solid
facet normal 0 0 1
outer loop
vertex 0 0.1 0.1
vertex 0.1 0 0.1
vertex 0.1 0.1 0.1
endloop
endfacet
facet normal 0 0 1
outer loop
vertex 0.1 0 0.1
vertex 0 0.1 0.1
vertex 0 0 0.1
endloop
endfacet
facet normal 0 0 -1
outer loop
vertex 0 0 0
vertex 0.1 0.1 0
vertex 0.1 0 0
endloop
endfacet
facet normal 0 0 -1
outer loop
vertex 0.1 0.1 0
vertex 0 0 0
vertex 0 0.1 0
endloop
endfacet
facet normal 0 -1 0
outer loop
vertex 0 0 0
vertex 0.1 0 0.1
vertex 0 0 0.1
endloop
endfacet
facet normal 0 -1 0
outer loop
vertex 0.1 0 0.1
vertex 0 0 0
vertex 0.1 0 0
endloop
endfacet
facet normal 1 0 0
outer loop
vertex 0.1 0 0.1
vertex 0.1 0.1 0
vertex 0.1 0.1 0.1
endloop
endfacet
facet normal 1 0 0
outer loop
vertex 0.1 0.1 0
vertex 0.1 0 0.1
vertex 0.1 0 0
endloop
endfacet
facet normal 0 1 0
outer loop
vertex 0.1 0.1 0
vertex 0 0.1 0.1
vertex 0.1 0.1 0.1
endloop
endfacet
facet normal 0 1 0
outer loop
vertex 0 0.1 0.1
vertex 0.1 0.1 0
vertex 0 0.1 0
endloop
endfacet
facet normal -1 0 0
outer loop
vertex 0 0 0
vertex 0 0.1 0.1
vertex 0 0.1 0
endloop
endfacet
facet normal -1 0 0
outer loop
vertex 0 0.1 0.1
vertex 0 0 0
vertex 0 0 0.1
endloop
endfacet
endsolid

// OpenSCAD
// SPDX-License-Identifier: MIT
// ----------------------------------------------------------------------------
// tq_threads_selftest.scad  --  STANDARD-TABLE self-test (parse/render time).
//
// Pure assertions (no heavy geometry): verifies the preset table integrity,
// preset-count floor, spot-check nominal values, and the ISO 965 fundamental-
// deviation formulae.  Renders only a trivial cube so `openscad -o out.stl`
// exits 0 on success and NONZERO on any failed assertion.
//
//   openscad -o selftest.stl tq_threads_selftest.scad
// ----------------------------------------------------------------------------

include <tq_threads.scad>

// -- preset table integrity --------------------------------------------------
assert(tq_presets_selfcheck(),
       "SELFTEST: preset table self-check failed (a row is malformed or unresolvable)");
assert(tq_preset_count() >= 101,
       str("SELFTEST: preset count regressed below 101 (v0.4 baseline): ", tq_preset_count()));

// -- spot-check nominal preset values (exact) --------------------------------
assert(tq_preset("M3")  == [3.0, 0.50],  "SELFTEST: M3 nominal");
assert(tq_preset("M8")  == [8.0, 1.25],  "SELFTEST: M8 nominal");
assert(tq_preset("M12") == [12.0, 1.75], "SELFTEST: M12 nominal");
assert(tq_preset("M10x1.25") == [10.0, 1.25], "SELFTEST: M10x1.25 fine");
assert(abs(tq_preset("1/4-20")[0] - 6.35) < 1e-9,       "SELFTEST: 1/4-20 major");
assert(abs(tq_preset("1/4-20")[1] - 25.4/20) < 1e-12,   "SELFTEST: 1/4-20 pitch");
assert(abs(tq_preset("#6-32")[0]  - 0.138*25.4) < 1e-9, "SELFTEST: #6-32 major");
assert(abs(tq_preset("#10-32")[1] - 25.4/32) < 1e-12,   "SELFTEST: #10-32 pitch");
assert(is_undef(tq_preset("NoSuchPreset")),             "SELFTEST: unknown -> undef");

// -- ISO 965-1 fundamental deviation formulae (exact, micrometres) -----------
assert(abs(_tq_fit_dev_mm("g", 1.25)*1000 - (-(15 + 11*1.25))) < 1e-9, "SELFTEST: es(g)");
assert(abs(_tq_fit_dev_mm("f", 1.0 )*1000 - (-(30 + 11*1.0 ))) < 1e-9, "SELFTEST: es(f)");
assert(abs(_tq_fit_dev_mm("e", 1.0 )*1000 - (-(50 + 11*1.0 ))) < 1e-9, "SELFTEST: es(e)");
assert(_tq_fit_dev_mm("h", 1.0) == 0,                                  "SELFTEST: es(h)=0");
assert(abs(_tq_fit_dev_mm("G", 1.5)*1000 - ( 15 + 11*1.5)) < 1e-9,     "SELFTEST: EI(G)");
assert(_tq_fit_dev_mm("H", 1.0) == 0,                                  "SELFTEST: EI(H)=0");

echo(str("SELFTEST PASS: ", tq_preset_count(), " presets, table + ISO 965 formulae OK"));
cube(0.1);   // trivial geometry so STL export succeeds
